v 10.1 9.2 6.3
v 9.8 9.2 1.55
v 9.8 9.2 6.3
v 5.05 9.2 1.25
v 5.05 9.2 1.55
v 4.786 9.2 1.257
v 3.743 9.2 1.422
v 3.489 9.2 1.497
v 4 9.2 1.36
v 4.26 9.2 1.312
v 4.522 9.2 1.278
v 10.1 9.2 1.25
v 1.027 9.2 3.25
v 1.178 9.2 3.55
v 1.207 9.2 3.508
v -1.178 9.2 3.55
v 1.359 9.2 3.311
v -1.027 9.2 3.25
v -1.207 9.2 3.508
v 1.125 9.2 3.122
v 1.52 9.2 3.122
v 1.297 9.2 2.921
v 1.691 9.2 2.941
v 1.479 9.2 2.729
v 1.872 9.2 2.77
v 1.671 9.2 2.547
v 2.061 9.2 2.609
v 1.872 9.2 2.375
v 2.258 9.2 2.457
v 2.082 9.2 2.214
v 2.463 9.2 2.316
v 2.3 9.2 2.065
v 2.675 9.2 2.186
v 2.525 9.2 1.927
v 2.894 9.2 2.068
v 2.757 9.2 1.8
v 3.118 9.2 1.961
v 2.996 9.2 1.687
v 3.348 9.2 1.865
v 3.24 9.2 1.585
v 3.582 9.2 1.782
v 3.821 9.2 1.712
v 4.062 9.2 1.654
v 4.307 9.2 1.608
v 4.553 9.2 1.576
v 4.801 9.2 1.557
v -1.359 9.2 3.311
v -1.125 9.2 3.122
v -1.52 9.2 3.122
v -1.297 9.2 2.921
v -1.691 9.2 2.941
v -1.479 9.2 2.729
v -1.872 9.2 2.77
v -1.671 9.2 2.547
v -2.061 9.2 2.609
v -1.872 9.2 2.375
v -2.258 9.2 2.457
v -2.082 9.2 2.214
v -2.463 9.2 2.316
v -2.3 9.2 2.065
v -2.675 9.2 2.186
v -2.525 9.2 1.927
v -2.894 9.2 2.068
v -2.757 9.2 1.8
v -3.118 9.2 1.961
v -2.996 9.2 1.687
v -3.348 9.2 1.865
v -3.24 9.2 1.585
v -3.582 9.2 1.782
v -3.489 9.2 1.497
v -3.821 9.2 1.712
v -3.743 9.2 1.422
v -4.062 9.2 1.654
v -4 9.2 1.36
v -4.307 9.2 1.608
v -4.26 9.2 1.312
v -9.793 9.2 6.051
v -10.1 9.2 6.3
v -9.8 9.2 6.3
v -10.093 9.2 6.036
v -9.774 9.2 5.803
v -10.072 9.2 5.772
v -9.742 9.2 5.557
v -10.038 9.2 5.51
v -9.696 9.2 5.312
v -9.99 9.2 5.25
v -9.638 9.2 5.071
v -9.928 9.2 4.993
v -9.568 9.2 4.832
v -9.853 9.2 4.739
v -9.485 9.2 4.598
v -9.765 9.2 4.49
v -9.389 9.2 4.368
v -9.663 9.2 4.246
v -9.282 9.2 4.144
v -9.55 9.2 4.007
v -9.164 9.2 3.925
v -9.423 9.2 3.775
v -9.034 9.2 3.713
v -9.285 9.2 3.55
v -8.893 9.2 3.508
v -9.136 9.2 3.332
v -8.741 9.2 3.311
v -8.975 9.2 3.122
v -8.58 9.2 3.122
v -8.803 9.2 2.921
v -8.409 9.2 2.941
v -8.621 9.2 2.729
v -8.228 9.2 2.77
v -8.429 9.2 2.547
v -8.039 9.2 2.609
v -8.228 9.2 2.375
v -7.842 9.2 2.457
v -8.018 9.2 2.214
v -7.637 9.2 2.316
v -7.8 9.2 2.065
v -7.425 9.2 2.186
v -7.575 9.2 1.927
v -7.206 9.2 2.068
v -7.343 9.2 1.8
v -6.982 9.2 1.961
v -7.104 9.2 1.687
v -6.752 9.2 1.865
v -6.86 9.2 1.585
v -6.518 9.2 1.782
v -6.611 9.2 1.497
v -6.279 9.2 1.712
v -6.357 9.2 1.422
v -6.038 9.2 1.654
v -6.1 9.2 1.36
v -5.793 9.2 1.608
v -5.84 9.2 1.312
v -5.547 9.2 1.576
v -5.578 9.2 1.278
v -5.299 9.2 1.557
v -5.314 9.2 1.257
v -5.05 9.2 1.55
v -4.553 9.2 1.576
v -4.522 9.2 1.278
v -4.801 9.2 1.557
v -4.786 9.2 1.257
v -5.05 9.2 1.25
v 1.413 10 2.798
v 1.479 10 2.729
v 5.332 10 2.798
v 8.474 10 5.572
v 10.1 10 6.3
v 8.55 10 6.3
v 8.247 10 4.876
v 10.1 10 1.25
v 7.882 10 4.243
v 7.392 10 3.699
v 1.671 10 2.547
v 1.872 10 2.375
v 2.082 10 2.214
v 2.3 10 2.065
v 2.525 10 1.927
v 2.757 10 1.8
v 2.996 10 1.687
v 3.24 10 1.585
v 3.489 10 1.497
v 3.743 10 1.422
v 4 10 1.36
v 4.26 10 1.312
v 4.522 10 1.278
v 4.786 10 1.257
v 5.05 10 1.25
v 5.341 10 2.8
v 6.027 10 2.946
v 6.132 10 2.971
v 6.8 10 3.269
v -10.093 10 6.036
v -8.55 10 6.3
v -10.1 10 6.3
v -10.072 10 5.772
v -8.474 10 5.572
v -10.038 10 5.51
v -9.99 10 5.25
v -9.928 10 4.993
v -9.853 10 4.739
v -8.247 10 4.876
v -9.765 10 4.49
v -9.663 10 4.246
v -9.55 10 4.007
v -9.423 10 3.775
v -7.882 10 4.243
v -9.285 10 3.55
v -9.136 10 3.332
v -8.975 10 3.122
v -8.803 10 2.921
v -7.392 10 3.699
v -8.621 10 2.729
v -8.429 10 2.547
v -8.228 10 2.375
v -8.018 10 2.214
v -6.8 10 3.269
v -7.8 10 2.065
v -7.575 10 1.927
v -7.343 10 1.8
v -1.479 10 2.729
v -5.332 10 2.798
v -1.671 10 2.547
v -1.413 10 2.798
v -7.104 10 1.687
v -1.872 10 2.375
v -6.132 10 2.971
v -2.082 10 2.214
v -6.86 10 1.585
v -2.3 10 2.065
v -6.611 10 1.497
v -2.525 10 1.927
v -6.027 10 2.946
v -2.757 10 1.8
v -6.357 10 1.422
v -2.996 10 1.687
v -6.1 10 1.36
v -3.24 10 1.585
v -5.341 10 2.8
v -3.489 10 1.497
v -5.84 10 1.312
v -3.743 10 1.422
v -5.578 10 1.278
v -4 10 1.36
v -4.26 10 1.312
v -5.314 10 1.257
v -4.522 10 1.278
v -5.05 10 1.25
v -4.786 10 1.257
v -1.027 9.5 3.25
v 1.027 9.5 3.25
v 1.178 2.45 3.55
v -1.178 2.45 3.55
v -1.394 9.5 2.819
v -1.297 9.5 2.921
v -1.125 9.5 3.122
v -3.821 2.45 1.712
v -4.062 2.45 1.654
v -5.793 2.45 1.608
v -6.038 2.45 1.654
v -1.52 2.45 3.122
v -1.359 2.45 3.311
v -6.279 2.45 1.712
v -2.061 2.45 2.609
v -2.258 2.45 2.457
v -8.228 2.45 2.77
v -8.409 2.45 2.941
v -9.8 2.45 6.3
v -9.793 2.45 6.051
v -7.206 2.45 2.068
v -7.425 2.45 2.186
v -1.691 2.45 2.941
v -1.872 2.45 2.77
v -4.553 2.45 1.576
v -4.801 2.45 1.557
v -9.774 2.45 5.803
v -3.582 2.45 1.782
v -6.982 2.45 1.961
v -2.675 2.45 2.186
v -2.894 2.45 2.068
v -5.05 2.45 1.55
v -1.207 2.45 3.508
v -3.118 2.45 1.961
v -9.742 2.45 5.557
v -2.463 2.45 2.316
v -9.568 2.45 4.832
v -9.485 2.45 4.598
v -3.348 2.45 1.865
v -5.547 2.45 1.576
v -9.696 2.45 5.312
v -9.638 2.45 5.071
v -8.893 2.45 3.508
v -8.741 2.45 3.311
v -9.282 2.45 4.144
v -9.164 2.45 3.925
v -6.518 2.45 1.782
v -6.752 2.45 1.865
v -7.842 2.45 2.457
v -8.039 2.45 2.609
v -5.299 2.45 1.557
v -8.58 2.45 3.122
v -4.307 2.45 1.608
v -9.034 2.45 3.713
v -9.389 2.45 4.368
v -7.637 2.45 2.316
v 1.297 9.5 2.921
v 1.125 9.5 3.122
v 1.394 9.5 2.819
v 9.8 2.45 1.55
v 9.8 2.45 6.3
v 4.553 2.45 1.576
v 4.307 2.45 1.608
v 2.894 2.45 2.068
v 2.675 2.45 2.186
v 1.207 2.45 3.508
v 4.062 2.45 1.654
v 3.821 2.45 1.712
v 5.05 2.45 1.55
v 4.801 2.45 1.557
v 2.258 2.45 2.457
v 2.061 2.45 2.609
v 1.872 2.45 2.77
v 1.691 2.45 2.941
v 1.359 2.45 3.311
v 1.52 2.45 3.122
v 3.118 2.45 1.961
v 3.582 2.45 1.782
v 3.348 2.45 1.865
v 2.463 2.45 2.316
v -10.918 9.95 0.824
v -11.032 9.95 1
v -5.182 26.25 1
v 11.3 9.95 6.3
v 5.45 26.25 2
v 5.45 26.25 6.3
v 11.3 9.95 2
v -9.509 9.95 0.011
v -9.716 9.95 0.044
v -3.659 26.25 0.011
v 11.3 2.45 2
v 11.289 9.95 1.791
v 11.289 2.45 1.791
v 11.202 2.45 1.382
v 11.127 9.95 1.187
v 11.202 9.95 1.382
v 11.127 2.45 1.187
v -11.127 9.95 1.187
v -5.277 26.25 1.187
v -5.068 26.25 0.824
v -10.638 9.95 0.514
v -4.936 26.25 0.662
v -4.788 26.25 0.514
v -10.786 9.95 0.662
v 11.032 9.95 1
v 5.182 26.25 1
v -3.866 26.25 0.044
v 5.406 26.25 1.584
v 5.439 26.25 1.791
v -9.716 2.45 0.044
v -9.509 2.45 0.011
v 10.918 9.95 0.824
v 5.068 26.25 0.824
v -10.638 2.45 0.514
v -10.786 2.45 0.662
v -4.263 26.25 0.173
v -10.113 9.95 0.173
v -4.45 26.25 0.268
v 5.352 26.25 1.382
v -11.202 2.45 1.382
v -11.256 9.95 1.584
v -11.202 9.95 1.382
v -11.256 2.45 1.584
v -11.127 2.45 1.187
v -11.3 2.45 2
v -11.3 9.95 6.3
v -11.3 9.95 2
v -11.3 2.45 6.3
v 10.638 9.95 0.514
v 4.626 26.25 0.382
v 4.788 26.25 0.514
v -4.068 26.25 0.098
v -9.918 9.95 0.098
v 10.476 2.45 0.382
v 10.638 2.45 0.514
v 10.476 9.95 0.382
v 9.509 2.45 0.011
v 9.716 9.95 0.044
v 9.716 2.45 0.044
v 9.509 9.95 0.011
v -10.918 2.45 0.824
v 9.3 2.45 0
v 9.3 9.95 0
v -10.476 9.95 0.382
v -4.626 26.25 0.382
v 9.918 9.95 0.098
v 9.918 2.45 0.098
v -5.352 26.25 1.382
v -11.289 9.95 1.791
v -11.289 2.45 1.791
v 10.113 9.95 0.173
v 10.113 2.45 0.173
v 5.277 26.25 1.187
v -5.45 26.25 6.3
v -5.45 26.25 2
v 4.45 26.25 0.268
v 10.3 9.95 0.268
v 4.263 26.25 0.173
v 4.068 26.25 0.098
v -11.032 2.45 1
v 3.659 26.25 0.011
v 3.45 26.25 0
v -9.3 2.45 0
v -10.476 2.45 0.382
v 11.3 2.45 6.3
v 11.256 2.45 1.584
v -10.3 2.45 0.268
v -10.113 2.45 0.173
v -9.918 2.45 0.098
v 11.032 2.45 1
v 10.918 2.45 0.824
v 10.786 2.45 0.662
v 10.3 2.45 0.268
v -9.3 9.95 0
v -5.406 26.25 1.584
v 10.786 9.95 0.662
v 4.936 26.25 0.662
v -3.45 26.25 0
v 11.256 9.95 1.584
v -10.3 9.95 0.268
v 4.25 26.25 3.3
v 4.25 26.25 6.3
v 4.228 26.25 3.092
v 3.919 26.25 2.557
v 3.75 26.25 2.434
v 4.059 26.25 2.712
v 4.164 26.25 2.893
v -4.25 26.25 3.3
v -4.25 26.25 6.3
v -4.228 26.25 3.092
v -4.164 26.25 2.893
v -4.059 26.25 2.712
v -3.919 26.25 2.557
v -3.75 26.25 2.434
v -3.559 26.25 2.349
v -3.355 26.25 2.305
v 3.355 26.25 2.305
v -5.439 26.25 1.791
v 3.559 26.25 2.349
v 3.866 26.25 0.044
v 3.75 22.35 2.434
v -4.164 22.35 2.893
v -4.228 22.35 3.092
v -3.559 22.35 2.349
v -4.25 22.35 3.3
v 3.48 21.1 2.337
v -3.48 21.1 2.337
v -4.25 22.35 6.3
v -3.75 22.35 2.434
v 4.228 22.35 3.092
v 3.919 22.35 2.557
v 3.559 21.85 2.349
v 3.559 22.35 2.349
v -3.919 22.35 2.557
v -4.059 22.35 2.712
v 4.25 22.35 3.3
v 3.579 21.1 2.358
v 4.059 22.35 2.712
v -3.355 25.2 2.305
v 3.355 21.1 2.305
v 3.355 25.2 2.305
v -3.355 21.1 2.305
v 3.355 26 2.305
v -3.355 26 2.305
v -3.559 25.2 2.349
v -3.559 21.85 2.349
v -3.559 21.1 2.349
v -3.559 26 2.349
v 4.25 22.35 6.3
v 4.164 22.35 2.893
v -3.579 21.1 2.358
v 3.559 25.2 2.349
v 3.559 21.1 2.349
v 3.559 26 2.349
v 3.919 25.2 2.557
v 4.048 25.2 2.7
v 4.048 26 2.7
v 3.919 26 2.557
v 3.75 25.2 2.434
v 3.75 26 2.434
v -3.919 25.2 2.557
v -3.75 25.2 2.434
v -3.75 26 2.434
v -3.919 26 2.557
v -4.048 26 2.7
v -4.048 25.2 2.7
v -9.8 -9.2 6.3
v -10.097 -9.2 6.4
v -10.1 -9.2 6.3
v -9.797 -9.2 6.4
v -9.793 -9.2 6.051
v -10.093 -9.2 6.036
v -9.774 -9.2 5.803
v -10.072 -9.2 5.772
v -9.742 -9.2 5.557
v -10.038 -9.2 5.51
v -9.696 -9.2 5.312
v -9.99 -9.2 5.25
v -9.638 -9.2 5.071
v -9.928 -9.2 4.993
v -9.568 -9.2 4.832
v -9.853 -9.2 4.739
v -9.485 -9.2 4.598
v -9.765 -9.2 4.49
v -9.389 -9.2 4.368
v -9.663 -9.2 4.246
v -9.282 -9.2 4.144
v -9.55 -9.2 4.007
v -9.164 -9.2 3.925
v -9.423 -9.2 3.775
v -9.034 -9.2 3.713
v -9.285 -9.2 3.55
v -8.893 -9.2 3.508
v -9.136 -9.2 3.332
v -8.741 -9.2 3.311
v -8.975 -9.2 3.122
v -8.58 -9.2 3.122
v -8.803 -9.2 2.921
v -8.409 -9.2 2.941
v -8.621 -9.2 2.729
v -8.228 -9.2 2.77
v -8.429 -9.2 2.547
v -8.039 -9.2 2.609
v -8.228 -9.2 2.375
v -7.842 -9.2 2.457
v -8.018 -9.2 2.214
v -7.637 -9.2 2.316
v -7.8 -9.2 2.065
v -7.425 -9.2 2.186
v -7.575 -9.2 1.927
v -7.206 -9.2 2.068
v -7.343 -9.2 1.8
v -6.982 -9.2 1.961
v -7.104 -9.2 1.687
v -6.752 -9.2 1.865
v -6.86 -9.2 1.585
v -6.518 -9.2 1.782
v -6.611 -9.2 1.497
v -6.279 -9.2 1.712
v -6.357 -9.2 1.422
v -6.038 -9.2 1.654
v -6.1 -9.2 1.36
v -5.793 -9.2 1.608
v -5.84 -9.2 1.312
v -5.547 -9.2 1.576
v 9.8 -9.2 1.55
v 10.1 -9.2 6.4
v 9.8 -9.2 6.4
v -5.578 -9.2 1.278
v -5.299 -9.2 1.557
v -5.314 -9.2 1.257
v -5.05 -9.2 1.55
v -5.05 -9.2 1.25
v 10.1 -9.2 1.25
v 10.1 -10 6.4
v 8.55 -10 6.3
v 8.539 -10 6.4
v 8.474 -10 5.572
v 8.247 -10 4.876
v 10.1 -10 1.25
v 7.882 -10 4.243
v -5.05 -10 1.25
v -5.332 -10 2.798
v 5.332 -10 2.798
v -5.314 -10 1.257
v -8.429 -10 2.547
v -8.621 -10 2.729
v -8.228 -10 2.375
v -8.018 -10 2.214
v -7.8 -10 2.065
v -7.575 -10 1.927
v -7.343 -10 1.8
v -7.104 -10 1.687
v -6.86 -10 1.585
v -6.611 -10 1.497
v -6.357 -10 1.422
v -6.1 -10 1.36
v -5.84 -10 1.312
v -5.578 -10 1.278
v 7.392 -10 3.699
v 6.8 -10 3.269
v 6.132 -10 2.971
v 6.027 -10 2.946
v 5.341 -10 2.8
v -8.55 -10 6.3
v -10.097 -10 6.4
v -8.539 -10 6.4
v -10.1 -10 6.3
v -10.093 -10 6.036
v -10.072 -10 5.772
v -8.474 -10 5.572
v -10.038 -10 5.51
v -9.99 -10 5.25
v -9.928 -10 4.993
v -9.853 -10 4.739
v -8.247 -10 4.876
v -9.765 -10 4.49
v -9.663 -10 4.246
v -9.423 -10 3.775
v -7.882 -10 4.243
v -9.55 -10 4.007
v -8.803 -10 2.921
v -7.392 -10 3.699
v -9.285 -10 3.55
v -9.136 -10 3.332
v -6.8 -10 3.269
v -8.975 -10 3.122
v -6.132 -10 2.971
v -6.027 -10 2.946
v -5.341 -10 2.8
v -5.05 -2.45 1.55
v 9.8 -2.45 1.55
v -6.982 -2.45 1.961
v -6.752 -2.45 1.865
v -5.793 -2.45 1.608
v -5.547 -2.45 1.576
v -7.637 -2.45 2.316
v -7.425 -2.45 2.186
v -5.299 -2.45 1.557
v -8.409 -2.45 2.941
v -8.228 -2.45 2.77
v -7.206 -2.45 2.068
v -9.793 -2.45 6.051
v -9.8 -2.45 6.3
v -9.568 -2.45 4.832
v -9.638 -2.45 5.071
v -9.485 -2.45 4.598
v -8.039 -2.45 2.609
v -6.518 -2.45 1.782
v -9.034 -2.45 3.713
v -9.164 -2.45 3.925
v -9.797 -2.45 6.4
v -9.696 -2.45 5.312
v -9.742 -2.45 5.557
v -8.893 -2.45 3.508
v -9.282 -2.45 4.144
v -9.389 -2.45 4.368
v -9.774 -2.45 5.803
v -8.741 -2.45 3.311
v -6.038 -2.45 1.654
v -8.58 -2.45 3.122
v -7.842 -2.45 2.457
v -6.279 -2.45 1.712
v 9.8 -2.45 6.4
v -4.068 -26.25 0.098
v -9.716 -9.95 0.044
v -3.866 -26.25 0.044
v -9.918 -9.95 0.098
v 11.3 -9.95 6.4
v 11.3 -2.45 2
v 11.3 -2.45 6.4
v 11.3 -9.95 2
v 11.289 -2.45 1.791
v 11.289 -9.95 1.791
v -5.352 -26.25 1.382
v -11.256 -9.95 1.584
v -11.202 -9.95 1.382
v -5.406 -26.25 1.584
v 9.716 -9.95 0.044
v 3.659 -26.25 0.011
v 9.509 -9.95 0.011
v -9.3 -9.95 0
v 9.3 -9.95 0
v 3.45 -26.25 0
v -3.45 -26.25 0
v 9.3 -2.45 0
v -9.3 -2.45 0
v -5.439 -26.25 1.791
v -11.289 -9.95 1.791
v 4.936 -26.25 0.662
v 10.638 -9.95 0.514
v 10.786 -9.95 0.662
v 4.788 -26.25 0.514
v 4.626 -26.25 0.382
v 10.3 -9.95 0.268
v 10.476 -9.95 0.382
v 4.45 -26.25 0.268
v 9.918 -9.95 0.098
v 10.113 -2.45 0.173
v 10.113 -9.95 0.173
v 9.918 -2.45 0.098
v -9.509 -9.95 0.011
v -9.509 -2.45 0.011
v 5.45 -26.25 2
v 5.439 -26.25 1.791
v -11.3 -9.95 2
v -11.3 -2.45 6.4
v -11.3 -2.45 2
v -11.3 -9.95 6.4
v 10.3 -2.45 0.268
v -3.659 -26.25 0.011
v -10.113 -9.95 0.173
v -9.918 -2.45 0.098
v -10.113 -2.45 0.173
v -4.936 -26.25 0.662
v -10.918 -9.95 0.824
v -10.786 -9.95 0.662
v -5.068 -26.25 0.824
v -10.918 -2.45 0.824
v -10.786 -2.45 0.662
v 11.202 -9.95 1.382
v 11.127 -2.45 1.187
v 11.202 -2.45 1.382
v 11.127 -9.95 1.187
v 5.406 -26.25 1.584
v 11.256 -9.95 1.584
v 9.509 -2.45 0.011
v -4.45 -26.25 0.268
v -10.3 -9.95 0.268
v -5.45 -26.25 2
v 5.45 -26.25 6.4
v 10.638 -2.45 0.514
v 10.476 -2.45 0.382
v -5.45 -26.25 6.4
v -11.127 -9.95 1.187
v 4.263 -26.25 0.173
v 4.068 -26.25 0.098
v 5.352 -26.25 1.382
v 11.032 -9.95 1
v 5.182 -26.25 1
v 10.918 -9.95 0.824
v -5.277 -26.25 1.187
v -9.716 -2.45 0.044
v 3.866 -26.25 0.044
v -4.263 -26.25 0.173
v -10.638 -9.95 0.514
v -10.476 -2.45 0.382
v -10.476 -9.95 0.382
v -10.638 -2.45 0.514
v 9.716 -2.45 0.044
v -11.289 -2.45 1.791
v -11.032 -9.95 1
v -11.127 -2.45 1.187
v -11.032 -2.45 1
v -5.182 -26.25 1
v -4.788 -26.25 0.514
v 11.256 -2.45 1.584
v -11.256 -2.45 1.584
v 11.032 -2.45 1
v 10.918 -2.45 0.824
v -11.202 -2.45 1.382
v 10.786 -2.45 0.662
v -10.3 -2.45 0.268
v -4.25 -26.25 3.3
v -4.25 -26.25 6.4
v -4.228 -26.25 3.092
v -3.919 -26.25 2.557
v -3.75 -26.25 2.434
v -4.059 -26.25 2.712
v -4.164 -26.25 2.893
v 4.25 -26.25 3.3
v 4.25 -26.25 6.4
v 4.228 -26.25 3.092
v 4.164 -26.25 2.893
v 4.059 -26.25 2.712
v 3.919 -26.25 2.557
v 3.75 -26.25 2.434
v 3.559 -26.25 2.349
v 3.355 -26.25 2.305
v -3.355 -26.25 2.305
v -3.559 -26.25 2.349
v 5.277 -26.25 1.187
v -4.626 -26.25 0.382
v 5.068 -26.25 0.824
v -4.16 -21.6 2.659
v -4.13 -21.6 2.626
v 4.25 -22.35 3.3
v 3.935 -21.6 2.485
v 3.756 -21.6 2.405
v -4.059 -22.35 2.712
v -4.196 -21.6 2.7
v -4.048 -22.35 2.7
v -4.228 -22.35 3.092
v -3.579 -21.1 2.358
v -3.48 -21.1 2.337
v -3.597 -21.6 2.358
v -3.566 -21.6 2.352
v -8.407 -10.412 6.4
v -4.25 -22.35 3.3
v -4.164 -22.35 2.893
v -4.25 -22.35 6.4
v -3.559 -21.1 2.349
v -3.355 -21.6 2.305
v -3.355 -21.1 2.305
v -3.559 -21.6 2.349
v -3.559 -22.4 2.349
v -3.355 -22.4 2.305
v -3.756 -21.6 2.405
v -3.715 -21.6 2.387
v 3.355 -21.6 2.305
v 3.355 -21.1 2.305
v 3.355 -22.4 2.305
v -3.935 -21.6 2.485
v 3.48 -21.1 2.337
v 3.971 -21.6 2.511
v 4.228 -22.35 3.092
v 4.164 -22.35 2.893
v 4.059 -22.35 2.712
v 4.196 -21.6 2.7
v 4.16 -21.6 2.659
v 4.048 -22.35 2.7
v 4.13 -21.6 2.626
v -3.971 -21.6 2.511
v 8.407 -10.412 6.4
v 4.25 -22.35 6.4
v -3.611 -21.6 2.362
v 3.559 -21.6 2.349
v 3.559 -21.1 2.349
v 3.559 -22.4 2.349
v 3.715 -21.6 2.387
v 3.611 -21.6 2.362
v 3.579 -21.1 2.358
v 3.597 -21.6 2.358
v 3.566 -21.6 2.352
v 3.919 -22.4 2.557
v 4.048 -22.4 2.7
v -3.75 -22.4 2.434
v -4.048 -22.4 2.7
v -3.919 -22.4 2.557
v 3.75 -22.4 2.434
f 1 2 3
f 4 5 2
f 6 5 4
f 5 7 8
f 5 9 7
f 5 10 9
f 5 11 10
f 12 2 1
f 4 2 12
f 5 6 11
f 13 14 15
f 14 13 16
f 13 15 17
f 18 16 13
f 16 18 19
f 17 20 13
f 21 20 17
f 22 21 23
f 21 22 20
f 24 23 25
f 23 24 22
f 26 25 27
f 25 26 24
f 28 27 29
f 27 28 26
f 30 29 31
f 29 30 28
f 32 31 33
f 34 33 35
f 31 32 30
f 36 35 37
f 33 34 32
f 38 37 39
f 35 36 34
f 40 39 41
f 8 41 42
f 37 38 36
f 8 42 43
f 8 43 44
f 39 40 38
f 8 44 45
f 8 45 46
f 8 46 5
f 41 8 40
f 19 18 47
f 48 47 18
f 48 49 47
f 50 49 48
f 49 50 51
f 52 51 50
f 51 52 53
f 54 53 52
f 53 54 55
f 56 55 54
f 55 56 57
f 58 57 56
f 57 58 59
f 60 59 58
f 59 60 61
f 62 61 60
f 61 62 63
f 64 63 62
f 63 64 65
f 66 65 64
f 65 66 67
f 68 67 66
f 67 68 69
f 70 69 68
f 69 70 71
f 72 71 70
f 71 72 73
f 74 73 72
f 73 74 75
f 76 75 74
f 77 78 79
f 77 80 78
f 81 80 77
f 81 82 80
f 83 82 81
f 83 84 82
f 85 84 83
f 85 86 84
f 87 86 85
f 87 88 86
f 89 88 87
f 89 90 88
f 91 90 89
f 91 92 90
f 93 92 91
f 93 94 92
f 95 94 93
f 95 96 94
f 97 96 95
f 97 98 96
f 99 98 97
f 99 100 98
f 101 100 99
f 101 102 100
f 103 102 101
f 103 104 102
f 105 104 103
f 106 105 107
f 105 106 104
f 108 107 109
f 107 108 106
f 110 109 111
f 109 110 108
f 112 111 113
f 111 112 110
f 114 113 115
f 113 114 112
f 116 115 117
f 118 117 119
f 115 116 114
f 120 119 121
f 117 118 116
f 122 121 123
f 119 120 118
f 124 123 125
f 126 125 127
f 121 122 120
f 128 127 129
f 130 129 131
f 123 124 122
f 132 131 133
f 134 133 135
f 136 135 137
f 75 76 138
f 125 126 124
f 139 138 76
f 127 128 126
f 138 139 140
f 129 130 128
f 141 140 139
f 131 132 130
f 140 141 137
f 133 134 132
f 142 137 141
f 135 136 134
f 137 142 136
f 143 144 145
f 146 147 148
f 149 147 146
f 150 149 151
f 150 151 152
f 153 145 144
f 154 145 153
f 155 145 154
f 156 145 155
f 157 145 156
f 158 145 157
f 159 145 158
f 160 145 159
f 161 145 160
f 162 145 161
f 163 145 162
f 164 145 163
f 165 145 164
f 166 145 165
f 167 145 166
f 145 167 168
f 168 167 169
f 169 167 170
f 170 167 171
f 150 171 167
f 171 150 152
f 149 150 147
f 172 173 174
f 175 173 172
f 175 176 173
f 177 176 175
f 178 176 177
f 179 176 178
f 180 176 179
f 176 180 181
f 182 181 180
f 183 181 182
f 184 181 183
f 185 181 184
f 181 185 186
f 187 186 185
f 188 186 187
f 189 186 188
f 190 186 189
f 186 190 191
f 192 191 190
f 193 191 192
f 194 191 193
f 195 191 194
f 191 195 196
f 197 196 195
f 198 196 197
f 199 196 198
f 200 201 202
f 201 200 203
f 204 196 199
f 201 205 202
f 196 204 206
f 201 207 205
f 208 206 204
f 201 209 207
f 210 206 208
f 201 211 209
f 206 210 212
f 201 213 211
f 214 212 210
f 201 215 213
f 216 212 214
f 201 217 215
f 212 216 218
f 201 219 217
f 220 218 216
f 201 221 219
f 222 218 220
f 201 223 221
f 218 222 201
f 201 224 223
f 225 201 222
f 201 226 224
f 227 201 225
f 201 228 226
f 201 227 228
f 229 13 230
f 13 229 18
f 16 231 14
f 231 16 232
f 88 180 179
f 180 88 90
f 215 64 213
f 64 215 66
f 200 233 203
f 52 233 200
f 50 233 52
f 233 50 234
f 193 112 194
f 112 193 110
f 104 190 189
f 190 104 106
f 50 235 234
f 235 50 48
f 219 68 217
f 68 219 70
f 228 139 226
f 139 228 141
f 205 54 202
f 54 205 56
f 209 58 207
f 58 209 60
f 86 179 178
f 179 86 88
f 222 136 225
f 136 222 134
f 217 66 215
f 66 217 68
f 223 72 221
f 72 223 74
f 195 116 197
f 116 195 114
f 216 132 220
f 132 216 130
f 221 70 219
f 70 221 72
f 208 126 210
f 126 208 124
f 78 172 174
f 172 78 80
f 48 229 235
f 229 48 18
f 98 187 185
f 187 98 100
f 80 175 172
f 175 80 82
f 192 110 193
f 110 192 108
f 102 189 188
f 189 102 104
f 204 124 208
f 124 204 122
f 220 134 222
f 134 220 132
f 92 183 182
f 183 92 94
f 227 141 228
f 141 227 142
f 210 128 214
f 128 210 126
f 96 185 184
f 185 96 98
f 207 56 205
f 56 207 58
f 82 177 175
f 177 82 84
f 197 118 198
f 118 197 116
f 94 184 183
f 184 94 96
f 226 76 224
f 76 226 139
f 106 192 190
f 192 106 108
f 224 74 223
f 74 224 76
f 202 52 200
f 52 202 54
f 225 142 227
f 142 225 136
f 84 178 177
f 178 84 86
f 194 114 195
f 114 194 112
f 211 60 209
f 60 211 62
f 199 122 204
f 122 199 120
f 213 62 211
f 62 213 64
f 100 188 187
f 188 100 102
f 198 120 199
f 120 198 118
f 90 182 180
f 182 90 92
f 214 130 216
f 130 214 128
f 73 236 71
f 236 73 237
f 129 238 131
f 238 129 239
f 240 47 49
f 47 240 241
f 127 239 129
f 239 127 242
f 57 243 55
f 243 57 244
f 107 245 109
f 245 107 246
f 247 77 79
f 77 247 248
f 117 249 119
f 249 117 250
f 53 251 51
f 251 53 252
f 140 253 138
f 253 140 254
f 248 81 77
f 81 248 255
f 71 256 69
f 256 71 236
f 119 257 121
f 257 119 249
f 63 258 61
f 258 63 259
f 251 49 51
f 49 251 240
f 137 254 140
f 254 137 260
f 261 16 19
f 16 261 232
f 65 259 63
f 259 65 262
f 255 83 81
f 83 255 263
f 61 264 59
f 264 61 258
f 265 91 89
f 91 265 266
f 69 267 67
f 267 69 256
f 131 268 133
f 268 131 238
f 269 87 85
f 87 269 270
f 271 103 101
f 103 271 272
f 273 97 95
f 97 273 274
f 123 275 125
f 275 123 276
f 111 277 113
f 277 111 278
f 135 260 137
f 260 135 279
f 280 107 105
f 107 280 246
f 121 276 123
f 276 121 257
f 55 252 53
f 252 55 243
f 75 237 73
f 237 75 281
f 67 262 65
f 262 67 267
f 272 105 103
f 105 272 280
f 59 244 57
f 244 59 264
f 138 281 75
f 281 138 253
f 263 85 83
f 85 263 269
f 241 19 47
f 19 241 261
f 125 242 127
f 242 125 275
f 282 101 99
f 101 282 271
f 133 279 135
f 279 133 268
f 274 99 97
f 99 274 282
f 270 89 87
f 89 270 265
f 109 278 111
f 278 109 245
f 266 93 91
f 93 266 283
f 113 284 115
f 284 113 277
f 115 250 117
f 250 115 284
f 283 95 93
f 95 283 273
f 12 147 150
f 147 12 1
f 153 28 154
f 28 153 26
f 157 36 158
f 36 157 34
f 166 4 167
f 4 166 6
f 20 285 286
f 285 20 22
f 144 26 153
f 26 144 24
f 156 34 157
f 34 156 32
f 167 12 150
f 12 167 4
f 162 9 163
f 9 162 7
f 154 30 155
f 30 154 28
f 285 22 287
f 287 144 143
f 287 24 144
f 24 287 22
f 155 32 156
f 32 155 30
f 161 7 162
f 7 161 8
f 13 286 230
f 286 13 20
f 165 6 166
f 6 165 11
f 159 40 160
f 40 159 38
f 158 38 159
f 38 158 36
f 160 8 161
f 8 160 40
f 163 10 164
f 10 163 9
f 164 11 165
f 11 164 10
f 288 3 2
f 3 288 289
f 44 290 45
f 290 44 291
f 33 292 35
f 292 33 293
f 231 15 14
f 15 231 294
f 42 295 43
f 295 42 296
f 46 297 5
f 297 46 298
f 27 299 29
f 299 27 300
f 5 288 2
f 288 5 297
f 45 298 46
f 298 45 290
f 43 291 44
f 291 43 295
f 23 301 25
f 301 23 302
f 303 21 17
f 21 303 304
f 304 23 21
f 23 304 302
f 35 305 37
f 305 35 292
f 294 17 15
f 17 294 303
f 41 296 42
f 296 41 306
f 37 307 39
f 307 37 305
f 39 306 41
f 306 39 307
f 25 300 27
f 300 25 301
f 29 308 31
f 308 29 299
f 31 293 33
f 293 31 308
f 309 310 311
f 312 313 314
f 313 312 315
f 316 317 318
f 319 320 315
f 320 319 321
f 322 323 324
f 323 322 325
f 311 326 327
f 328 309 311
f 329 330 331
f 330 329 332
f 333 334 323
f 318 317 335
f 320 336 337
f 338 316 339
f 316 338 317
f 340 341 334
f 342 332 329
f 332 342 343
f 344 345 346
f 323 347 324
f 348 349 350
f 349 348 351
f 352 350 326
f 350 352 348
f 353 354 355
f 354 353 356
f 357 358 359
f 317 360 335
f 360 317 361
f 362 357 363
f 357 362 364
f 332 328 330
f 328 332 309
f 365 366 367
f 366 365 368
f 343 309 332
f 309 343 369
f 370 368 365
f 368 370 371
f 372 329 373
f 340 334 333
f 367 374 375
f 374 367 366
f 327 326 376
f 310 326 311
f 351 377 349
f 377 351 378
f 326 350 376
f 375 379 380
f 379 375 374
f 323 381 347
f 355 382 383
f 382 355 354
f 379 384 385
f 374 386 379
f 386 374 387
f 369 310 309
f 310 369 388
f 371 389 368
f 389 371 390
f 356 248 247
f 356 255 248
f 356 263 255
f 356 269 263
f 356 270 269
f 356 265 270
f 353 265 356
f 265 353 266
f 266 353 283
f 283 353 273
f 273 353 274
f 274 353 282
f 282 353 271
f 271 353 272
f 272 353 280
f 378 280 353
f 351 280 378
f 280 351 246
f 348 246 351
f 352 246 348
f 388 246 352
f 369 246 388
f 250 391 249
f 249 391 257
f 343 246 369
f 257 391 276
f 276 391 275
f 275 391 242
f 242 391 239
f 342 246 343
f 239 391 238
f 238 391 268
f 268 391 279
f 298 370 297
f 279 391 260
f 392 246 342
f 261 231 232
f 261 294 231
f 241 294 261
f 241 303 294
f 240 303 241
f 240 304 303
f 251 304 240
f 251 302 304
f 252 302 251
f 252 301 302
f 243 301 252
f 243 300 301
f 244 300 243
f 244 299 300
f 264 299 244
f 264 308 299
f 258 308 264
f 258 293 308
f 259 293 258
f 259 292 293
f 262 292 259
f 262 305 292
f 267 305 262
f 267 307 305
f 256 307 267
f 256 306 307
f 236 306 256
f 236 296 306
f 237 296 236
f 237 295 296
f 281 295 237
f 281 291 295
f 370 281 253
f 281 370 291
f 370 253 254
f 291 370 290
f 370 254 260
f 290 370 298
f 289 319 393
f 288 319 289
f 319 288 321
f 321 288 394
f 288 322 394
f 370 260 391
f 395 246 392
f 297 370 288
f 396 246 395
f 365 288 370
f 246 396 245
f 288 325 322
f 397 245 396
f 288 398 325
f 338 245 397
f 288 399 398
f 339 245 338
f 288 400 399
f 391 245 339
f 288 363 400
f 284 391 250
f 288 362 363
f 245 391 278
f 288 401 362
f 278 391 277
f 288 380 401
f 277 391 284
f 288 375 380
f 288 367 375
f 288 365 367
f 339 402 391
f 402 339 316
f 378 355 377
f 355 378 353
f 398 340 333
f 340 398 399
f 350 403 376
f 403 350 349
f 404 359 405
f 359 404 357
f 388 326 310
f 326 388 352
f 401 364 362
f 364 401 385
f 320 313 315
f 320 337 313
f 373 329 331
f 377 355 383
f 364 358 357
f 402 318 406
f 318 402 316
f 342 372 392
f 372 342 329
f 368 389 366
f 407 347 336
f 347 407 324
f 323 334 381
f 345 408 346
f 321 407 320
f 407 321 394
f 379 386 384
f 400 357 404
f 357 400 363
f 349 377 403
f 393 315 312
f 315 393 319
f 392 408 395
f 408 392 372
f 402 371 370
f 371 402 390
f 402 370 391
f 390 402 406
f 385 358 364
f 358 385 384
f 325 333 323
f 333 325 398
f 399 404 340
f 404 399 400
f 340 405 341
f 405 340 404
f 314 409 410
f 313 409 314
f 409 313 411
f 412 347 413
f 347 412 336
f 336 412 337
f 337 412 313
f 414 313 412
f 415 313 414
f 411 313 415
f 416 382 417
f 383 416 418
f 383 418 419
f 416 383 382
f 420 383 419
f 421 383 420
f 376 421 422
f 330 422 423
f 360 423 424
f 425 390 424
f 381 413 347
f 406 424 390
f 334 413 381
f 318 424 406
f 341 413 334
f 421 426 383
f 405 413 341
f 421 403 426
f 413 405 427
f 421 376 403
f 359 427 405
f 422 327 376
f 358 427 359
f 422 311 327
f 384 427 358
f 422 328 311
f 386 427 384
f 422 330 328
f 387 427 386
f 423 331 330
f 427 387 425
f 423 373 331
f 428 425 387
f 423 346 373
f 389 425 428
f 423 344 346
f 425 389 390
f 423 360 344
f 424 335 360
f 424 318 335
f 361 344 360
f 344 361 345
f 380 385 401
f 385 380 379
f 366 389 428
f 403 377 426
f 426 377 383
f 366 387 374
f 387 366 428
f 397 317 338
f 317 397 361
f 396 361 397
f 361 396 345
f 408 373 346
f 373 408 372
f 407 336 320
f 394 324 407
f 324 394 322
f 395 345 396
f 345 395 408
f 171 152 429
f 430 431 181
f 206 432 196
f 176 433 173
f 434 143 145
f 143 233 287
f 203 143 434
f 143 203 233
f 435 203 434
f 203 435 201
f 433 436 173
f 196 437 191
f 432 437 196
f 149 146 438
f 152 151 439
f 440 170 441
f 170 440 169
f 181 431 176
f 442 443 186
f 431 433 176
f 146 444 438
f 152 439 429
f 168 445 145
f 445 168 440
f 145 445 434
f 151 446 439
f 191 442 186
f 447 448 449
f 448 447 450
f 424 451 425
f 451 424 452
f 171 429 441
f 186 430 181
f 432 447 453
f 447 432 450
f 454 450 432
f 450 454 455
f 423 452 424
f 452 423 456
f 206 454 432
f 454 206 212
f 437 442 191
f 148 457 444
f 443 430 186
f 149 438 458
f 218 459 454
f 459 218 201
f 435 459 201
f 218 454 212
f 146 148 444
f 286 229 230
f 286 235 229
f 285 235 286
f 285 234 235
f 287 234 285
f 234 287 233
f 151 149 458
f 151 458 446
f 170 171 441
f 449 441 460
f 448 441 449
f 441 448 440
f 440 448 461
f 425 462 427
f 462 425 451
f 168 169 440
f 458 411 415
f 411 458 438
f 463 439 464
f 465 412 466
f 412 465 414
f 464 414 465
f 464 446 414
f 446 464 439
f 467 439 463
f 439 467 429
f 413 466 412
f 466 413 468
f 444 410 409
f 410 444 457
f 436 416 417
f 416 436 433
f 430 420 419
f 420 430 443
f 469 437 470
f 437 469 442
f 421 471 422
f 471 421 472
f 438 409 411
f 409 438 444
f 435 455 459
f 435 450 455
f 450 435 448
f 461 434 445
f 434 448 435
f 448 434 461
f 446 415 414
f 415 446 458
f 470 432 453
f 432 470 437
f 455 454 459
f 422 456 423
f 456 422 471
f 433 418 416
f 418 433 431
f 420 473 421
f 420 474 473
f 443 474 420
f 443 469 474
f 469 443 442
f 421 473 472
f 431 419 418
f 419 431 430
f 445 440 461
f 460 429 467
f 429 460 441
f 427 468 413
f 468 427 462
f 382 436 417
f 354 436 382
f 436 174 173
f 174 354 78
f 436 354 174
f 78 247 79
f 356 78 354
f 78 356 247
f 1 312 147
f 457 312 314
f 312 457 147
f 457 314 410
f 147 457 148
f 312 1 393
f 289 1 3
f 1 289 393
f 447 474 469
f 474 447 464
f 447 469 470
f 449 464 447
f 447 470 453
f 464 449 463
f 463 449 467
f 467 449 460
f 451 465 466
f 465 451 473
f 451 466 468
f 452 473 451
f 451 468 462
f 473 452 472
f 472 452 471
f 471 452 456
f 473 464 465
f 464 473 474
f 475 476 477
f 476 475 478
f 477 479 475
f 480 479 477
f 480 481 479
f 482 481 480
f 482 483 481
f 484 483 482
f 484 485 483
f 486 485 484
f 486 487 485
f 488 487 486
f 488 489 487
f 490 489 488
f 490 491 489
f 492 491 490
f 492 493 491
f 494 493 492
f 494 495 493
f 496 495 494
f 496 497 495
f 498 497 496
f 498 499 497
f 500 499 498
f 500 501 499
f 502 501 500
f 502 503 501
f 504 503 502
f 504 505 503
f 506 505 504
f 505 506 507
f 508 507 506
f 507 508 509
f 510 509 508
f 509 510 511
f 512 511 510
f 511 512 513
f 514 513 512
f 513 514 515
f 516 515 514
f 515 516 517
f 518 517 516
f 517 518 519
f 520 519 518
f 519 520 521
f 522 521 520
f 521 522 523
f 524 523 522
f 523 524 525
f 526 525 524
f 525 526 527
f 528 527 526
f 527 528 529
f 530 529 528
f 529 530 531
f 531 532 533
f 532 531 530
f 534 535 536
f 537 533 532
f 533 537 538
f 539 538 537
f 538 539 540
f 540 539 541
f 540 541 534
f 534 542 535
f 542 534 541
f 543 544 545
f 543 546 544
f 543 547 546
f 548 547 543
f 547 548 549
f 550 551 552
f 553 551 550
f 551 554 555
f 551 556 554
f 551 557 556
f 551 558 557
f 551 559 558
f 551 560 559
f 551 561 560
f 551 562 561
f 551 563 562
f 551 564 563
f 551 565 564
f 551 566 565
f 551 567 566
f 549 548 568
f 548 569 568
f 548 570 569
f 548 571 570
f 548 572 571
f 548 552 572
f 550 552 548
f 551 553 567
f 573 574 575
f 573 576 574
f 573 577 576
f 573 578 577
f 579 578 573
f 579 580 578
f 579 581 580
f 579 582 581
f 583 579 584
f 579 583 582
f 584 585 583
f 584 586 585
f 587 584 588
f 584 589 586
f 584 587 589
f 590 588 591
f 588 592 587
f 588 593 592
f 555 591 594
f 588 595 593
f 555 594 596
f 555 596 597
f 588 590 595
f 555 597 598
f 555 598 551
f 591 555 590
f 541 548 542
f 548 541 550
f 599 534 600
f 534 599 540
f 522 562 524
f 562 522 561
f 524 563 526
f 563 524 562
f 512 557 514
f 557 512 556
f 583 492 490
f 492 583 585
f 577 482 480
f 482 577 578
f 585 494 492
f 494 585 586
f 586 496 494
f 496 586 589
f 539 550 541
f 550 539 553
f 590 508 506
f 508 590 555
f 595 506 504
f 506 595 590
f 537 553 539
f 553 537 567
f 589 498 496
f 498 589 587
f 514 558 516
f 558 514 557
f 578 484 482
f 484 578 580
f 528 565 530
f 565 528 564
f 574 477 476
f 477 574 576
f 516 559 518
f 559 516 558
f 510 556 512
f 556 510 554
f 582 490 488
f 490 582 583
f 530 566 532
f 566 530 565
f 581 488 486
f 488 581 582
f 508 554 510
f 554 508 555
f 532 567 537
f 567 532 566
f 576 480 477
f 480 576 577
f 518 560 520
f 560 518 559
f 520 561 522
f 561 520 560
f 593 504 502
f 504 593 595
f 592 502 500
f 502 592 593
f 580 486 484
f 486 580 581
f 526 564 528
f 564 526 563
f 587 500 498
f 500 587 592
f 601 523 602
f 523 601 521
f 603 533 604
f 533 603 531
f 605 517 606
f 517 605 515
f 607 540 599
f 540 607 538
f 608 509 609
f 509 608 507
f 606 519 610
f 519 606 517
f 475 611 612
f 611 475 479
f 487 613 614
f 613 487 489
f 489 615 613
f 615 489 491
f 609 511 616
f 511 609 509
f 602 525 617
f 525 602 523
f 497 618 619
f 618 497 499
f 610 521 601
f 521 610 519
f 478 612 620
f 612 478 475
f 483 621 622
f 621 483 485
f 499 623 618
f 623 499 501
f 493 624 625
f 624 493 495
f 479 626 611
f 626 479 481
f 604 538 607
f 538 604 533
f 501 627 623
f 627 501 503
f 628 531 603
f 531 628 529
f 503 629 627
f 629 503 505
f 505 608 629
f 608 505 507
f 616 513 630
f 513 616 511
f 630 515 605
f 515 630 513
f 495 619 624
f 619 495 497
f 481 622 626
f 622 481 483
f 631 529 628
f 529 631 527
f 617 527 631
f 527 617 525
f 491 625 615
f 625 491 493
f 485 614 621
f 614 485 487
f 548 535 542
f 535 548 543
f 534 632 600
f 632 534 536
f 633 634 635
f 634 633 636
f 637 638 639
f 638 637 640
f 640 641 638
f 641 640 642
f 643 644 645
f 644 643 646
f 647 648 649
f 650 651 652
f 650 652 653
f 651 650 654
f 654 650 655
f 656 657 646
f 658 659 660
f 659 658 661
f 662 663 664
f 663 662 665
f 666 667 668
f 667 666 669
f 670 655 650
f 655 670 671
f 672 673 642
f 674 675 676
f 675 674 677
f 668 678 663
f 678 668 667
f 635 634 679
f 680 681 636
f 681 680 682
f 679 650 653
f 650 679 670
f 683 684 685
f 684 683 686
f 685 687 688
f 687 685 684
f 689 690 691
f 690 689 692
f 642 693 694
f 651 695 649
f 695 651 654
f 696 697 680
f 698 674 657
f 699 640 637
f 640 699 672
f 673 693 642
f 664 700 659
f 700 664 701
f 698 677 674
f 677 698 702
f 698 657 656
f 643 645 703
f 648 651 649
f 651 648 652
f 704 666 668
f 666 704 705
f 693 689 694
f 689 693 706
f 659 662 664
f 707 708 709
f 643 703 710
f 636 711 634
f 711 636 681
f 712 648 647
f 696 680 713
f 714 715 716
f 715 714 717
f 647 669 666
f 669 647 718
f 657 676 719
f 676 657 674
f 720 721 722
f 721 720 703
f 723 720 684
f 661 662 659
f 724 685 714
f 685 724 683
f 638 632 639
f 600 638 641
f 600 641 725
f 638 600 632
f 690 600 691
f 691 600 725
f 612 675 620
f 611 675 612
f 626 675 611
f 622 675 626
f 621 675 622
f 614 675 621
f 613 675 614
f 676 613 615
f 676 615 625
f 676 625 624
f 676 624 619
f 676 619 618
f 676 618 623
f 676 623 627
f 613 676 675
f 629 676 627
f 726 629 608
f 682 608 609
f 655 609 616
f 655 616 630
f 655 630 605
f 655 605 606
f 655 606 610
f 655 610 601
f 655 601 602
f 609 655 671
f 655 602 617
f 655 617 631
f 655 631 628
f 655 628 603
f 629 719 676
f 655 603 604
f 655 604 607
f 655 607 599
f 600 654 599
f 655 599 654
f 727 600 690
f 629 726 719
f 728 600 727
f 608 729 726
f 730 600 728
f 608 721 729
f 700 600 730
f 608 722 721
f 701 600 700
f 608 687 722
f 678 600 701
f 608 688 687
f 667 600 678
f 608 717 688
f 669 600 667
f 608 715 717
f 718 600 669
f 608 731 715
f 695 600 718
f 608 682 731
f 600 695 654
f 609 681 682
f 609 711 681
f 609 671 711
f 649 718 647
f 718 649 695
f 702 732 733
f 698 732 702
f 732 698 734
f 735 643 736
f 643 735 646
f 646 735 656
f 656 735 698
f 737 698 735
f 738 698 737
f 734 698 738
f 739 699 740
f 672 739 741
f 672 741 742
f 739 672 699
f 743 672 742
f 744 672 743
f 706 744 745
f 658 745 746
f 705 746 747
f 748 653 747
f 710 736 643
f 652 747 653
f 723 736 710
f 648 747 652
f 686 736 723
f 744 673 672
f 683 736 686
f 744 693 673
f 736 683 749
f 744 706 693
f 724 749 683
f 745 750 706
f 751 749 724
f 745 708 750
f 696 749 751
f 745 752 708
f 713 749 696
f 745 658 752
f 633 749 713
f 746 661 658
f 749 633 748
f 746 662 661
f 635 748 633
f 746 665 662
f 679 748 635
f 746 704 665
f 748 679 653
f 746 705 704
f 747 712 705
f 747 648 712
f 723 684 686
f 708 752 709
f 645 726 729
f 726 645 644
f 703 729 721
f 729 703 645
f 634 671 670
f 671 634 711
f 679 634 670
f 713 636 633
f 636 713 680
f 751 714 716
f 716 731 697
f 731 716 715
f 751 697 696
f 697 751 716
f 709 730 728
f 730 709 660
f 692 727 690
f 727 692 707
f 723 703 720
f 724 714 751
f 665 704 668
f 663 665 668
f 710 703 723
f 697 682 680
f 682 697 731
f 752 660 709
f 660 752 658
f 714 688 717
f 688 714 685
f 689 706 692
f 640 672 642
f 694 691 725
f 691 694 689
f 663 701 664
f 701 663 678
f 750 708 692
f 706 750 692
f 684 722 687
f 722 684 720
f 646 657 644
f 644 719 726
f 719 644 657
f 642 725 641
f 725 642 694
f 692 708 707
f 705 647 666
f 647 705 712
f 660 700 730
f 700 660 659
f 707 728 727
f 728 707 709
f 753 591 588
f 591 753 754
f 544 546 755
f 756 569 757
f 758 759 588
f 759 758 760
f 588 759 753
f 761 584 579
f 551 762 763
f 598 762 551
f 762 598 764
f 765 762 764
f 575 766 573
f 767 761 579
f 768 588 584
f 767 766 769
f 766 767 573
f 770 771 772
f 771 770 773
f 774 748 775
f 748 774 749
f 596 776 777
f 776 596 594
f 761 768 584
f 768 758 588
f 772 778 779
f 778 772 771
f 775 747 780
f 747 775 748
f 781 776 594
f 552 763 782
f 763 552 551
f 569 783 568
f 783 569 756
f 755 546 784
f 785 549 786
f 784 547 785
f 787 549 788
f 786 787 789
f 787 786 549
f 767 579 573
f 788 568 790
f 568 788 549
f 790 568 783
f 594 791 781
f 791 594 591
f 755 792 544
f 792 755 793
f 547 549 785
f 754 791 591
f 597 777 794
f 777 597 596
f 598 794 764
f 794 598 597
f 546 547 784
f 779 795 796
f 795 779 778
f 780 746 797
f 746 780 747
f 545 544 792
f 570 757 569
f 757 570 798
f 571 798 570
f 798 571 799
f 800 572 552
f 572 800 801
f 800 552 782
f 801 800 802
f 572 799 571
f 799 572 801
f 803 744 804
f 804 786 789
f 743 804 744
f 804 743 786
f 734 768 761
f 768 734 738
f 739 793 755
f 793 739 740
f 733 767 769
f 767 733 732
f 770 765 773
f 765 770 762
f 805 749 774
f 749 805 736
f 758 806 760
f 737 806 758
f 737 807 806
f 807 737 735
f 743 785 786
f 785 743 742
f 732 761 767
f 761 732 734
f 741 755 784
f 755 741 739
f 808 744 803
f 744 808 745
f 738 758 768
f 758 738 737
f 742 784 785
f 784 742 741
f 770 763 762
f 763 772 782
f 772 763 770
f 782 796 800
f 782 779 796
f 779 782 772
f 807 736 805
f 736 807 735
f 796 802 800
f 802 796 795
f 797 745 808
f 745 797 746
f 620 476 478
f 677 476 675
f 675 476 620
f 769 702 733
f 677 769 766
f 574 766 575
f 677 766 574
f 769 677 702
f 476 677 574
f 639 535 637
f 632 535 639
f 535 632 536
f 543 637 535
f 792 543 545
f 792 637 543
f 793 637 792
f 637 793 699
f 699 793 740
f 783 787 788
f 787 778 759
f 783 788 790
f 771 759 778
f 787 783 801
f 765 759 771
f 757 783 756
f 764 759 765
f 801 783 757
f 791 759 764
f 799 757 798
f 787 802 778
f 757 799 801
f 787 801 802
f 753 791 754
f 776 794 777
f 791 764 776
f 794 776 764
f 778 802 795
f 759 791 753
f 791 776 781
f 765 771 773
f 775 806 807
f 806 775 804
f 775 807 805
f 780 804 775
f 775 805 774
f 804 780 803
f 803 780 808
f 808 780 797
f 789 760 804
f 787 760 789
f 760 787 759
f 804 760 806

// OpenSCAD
// file: ec5.scad
$fn = 120;

ec5_male();
translate([0, 12, 0]) ec5_female();


module ec5_male(t=0.2, fill=false) {
    difference() {
        union() {
            translate([-(19.3-9.2)/2, -(9.2+t)/2, 0]) {
                translate([0, -0.6/2, 0]) cube([10+t, 7.8+t, 0.8]);
                cube([10+t, 7.2+t, 7.8]);
            }
            translate([-(19.3-9.2)/2, 0, 0]) {
                cylinder(d=9.8+t, h=0.8);
                cylinder(d=9.2+t, h=25);
            }
            translate([(19.3-9.2)/2, 0, 0]) {
                ec5_plus(d=9.8+t, h=0.8);
                ec5_plus(d=9.2+t, h=25);
            }
        }
        if(fill == false) {
            translate([-(19.3-9.2)/2, 0, 8]) cylinder(d=8-t, h=25.1);
            translate([(19.3-9.2)/2, 0, 8]) ec5_plus(d=8-t, h=25.1);
        }
    }
    translate([-(19.3-9.2)/2, 0, 0]) cylinder(d=5+t, h=21.2+t);
    translate([(19.3-9.2)/2, 0, 0]) cylinder(d=5+t, h=21.2+t);
}



module ec5_female(t=0.2, fill=false) {
    difference() {
        union() {
            translate([-(19.3-9.2)/2, -(9.2+t)/2+2, 0]) {
                translate([0, -0.6/2, 0]) cube([10+t, 7.8+t, 0.8]);
                cube([10+t, 7.2+t, 7.8]);
            }
            translate([-(19.3-9.2)/2, 0, 0]) {
                cylinder(d=9.8+t, h=0.8);
                cylinder(d=9.2+t, h=7.8);
                cylinder(d=7.7+t, h=23.7);
            }
            translate([(19.3-9.2)/2, 0, 0]) {
                ec5_plus(d=9.8+t, h=0.8);
                ec5_plus(d=9.2+t, h=7.8);
                ec5_plus(d=7.7+t, h=23.7);
            }
        }
        if(fill == false) {
            translate([-(19.3-9.2)/2, 0, 8]) cylinder(d=6.3+t, h=25.1);
            translate([(19.3-9.2)/2, 0, 8]) cylinder(d=6.3+t, h=25.1);
        }
    }
    translate([-(19.3-9.2)/2, 0, 0]) difference() {
        cylinder(d=6.5, h=20.4+t);
        cylinder(d=5+t, h=20.6+t);
    }
    translate([(19.3-9.2)/2, 0, 0]) difference() {
        cylinder(d=6.5, h=20.4+t);
        cylinder(d=5+t, h=20.6+t);
    }
}


module ec5_plus(d, h) {
    hull() {
        cylinder(d=d, h=h);
        translate([0, -d/2, 0]) cube([d/2, d, h]);
    }
}
// main file
use<ec5.scad>

// 2.5mm² * 2 : [8.5, 8.0]
// 2.5mm² / AWG 14: [8.5, 4.0]
// 1.5mm² / AWG 16: [5.0, 3.2]

printable_grip(wiresize = [8.5, 8.0]);


module printable_grip(wiresize = []) {
    translate([0, 10, 6.3]) rotate([90, 0, 0]) half_grip(wiresize = wiresize);
    translate([0, -10, 6.3]) rotate([-90, 0, 0]) half_grip(half=1, wiresize = wiresize);
}


module half_grip(half = 0, wiresize = [8, 4]) {
    difference() {
        hull() {
            translate([0, 0, 3.8]) roundedCube([22.6, 12.6, 7.5], 2, center=true, $fn=60);
            translate([0, 0, -16]) roundedCube([wiresize[0]+2.4, 12.6, 0.5], 2, center=true, $fn=60);
        }
        ec5_female(t=0.3);
        hull() {
            translate([-5.05, 0, 0]) cylinder(d=7, h=0.5, $fn=30);
            translate([5.05, 0, 0]) cylinder(d=7, h=0.5, $fn=30);
            translate([0, 0, -12.1]) roundedCube([wiresize[0], wiresize[1], 0.5], 1, center=true, $fn=30);
        }
        translate([0, 0, -14.1]) roundedCube([wiresize[0], wiresize[1], 6], 1, center=true, $fn=30);
        if(half == 0)
            translate([-20, 0, -20]) cube([40, 20, 40]);
        else
            translate([-20, -20.1, -20]) cube([40, 20, 40]);
    }
    if(half == 0)
        translate([0, -wiresize[1]*0.5, -15.6]) cube([wiresize[0], 0.8, 0.8], center=true);
    else
        translate([0, wiresize[1]*0.5, -12]) cube([wiresize[0], 0.8, 0.8], center=true);
}


module roundedCube(size, radius, center) {
    if(center) translate([0, 0, 0]);
    else translate([size[0]/2, size[1]/2, 0]);
    hull() {
        translate([-size[0]/2 + radius, -size[1]/2 + radius, 0]) cylinder(r=radius, h=size[2], center=center);
        translate([size[0]/2 - radius, -size[1]/2 + radius, 0]) cylinder(r=radius, h=size[2], center=center);
        translate([-size[0]/2 + radius, size[1]/2 - radius, 0]) cylinder(r=radius, h=size[2], center=center);
        translate([size[0]/2 - radius, size[1]/2 - radius, 0]) cylinder(r=radius, h=size[2], center=center);
    }
}
